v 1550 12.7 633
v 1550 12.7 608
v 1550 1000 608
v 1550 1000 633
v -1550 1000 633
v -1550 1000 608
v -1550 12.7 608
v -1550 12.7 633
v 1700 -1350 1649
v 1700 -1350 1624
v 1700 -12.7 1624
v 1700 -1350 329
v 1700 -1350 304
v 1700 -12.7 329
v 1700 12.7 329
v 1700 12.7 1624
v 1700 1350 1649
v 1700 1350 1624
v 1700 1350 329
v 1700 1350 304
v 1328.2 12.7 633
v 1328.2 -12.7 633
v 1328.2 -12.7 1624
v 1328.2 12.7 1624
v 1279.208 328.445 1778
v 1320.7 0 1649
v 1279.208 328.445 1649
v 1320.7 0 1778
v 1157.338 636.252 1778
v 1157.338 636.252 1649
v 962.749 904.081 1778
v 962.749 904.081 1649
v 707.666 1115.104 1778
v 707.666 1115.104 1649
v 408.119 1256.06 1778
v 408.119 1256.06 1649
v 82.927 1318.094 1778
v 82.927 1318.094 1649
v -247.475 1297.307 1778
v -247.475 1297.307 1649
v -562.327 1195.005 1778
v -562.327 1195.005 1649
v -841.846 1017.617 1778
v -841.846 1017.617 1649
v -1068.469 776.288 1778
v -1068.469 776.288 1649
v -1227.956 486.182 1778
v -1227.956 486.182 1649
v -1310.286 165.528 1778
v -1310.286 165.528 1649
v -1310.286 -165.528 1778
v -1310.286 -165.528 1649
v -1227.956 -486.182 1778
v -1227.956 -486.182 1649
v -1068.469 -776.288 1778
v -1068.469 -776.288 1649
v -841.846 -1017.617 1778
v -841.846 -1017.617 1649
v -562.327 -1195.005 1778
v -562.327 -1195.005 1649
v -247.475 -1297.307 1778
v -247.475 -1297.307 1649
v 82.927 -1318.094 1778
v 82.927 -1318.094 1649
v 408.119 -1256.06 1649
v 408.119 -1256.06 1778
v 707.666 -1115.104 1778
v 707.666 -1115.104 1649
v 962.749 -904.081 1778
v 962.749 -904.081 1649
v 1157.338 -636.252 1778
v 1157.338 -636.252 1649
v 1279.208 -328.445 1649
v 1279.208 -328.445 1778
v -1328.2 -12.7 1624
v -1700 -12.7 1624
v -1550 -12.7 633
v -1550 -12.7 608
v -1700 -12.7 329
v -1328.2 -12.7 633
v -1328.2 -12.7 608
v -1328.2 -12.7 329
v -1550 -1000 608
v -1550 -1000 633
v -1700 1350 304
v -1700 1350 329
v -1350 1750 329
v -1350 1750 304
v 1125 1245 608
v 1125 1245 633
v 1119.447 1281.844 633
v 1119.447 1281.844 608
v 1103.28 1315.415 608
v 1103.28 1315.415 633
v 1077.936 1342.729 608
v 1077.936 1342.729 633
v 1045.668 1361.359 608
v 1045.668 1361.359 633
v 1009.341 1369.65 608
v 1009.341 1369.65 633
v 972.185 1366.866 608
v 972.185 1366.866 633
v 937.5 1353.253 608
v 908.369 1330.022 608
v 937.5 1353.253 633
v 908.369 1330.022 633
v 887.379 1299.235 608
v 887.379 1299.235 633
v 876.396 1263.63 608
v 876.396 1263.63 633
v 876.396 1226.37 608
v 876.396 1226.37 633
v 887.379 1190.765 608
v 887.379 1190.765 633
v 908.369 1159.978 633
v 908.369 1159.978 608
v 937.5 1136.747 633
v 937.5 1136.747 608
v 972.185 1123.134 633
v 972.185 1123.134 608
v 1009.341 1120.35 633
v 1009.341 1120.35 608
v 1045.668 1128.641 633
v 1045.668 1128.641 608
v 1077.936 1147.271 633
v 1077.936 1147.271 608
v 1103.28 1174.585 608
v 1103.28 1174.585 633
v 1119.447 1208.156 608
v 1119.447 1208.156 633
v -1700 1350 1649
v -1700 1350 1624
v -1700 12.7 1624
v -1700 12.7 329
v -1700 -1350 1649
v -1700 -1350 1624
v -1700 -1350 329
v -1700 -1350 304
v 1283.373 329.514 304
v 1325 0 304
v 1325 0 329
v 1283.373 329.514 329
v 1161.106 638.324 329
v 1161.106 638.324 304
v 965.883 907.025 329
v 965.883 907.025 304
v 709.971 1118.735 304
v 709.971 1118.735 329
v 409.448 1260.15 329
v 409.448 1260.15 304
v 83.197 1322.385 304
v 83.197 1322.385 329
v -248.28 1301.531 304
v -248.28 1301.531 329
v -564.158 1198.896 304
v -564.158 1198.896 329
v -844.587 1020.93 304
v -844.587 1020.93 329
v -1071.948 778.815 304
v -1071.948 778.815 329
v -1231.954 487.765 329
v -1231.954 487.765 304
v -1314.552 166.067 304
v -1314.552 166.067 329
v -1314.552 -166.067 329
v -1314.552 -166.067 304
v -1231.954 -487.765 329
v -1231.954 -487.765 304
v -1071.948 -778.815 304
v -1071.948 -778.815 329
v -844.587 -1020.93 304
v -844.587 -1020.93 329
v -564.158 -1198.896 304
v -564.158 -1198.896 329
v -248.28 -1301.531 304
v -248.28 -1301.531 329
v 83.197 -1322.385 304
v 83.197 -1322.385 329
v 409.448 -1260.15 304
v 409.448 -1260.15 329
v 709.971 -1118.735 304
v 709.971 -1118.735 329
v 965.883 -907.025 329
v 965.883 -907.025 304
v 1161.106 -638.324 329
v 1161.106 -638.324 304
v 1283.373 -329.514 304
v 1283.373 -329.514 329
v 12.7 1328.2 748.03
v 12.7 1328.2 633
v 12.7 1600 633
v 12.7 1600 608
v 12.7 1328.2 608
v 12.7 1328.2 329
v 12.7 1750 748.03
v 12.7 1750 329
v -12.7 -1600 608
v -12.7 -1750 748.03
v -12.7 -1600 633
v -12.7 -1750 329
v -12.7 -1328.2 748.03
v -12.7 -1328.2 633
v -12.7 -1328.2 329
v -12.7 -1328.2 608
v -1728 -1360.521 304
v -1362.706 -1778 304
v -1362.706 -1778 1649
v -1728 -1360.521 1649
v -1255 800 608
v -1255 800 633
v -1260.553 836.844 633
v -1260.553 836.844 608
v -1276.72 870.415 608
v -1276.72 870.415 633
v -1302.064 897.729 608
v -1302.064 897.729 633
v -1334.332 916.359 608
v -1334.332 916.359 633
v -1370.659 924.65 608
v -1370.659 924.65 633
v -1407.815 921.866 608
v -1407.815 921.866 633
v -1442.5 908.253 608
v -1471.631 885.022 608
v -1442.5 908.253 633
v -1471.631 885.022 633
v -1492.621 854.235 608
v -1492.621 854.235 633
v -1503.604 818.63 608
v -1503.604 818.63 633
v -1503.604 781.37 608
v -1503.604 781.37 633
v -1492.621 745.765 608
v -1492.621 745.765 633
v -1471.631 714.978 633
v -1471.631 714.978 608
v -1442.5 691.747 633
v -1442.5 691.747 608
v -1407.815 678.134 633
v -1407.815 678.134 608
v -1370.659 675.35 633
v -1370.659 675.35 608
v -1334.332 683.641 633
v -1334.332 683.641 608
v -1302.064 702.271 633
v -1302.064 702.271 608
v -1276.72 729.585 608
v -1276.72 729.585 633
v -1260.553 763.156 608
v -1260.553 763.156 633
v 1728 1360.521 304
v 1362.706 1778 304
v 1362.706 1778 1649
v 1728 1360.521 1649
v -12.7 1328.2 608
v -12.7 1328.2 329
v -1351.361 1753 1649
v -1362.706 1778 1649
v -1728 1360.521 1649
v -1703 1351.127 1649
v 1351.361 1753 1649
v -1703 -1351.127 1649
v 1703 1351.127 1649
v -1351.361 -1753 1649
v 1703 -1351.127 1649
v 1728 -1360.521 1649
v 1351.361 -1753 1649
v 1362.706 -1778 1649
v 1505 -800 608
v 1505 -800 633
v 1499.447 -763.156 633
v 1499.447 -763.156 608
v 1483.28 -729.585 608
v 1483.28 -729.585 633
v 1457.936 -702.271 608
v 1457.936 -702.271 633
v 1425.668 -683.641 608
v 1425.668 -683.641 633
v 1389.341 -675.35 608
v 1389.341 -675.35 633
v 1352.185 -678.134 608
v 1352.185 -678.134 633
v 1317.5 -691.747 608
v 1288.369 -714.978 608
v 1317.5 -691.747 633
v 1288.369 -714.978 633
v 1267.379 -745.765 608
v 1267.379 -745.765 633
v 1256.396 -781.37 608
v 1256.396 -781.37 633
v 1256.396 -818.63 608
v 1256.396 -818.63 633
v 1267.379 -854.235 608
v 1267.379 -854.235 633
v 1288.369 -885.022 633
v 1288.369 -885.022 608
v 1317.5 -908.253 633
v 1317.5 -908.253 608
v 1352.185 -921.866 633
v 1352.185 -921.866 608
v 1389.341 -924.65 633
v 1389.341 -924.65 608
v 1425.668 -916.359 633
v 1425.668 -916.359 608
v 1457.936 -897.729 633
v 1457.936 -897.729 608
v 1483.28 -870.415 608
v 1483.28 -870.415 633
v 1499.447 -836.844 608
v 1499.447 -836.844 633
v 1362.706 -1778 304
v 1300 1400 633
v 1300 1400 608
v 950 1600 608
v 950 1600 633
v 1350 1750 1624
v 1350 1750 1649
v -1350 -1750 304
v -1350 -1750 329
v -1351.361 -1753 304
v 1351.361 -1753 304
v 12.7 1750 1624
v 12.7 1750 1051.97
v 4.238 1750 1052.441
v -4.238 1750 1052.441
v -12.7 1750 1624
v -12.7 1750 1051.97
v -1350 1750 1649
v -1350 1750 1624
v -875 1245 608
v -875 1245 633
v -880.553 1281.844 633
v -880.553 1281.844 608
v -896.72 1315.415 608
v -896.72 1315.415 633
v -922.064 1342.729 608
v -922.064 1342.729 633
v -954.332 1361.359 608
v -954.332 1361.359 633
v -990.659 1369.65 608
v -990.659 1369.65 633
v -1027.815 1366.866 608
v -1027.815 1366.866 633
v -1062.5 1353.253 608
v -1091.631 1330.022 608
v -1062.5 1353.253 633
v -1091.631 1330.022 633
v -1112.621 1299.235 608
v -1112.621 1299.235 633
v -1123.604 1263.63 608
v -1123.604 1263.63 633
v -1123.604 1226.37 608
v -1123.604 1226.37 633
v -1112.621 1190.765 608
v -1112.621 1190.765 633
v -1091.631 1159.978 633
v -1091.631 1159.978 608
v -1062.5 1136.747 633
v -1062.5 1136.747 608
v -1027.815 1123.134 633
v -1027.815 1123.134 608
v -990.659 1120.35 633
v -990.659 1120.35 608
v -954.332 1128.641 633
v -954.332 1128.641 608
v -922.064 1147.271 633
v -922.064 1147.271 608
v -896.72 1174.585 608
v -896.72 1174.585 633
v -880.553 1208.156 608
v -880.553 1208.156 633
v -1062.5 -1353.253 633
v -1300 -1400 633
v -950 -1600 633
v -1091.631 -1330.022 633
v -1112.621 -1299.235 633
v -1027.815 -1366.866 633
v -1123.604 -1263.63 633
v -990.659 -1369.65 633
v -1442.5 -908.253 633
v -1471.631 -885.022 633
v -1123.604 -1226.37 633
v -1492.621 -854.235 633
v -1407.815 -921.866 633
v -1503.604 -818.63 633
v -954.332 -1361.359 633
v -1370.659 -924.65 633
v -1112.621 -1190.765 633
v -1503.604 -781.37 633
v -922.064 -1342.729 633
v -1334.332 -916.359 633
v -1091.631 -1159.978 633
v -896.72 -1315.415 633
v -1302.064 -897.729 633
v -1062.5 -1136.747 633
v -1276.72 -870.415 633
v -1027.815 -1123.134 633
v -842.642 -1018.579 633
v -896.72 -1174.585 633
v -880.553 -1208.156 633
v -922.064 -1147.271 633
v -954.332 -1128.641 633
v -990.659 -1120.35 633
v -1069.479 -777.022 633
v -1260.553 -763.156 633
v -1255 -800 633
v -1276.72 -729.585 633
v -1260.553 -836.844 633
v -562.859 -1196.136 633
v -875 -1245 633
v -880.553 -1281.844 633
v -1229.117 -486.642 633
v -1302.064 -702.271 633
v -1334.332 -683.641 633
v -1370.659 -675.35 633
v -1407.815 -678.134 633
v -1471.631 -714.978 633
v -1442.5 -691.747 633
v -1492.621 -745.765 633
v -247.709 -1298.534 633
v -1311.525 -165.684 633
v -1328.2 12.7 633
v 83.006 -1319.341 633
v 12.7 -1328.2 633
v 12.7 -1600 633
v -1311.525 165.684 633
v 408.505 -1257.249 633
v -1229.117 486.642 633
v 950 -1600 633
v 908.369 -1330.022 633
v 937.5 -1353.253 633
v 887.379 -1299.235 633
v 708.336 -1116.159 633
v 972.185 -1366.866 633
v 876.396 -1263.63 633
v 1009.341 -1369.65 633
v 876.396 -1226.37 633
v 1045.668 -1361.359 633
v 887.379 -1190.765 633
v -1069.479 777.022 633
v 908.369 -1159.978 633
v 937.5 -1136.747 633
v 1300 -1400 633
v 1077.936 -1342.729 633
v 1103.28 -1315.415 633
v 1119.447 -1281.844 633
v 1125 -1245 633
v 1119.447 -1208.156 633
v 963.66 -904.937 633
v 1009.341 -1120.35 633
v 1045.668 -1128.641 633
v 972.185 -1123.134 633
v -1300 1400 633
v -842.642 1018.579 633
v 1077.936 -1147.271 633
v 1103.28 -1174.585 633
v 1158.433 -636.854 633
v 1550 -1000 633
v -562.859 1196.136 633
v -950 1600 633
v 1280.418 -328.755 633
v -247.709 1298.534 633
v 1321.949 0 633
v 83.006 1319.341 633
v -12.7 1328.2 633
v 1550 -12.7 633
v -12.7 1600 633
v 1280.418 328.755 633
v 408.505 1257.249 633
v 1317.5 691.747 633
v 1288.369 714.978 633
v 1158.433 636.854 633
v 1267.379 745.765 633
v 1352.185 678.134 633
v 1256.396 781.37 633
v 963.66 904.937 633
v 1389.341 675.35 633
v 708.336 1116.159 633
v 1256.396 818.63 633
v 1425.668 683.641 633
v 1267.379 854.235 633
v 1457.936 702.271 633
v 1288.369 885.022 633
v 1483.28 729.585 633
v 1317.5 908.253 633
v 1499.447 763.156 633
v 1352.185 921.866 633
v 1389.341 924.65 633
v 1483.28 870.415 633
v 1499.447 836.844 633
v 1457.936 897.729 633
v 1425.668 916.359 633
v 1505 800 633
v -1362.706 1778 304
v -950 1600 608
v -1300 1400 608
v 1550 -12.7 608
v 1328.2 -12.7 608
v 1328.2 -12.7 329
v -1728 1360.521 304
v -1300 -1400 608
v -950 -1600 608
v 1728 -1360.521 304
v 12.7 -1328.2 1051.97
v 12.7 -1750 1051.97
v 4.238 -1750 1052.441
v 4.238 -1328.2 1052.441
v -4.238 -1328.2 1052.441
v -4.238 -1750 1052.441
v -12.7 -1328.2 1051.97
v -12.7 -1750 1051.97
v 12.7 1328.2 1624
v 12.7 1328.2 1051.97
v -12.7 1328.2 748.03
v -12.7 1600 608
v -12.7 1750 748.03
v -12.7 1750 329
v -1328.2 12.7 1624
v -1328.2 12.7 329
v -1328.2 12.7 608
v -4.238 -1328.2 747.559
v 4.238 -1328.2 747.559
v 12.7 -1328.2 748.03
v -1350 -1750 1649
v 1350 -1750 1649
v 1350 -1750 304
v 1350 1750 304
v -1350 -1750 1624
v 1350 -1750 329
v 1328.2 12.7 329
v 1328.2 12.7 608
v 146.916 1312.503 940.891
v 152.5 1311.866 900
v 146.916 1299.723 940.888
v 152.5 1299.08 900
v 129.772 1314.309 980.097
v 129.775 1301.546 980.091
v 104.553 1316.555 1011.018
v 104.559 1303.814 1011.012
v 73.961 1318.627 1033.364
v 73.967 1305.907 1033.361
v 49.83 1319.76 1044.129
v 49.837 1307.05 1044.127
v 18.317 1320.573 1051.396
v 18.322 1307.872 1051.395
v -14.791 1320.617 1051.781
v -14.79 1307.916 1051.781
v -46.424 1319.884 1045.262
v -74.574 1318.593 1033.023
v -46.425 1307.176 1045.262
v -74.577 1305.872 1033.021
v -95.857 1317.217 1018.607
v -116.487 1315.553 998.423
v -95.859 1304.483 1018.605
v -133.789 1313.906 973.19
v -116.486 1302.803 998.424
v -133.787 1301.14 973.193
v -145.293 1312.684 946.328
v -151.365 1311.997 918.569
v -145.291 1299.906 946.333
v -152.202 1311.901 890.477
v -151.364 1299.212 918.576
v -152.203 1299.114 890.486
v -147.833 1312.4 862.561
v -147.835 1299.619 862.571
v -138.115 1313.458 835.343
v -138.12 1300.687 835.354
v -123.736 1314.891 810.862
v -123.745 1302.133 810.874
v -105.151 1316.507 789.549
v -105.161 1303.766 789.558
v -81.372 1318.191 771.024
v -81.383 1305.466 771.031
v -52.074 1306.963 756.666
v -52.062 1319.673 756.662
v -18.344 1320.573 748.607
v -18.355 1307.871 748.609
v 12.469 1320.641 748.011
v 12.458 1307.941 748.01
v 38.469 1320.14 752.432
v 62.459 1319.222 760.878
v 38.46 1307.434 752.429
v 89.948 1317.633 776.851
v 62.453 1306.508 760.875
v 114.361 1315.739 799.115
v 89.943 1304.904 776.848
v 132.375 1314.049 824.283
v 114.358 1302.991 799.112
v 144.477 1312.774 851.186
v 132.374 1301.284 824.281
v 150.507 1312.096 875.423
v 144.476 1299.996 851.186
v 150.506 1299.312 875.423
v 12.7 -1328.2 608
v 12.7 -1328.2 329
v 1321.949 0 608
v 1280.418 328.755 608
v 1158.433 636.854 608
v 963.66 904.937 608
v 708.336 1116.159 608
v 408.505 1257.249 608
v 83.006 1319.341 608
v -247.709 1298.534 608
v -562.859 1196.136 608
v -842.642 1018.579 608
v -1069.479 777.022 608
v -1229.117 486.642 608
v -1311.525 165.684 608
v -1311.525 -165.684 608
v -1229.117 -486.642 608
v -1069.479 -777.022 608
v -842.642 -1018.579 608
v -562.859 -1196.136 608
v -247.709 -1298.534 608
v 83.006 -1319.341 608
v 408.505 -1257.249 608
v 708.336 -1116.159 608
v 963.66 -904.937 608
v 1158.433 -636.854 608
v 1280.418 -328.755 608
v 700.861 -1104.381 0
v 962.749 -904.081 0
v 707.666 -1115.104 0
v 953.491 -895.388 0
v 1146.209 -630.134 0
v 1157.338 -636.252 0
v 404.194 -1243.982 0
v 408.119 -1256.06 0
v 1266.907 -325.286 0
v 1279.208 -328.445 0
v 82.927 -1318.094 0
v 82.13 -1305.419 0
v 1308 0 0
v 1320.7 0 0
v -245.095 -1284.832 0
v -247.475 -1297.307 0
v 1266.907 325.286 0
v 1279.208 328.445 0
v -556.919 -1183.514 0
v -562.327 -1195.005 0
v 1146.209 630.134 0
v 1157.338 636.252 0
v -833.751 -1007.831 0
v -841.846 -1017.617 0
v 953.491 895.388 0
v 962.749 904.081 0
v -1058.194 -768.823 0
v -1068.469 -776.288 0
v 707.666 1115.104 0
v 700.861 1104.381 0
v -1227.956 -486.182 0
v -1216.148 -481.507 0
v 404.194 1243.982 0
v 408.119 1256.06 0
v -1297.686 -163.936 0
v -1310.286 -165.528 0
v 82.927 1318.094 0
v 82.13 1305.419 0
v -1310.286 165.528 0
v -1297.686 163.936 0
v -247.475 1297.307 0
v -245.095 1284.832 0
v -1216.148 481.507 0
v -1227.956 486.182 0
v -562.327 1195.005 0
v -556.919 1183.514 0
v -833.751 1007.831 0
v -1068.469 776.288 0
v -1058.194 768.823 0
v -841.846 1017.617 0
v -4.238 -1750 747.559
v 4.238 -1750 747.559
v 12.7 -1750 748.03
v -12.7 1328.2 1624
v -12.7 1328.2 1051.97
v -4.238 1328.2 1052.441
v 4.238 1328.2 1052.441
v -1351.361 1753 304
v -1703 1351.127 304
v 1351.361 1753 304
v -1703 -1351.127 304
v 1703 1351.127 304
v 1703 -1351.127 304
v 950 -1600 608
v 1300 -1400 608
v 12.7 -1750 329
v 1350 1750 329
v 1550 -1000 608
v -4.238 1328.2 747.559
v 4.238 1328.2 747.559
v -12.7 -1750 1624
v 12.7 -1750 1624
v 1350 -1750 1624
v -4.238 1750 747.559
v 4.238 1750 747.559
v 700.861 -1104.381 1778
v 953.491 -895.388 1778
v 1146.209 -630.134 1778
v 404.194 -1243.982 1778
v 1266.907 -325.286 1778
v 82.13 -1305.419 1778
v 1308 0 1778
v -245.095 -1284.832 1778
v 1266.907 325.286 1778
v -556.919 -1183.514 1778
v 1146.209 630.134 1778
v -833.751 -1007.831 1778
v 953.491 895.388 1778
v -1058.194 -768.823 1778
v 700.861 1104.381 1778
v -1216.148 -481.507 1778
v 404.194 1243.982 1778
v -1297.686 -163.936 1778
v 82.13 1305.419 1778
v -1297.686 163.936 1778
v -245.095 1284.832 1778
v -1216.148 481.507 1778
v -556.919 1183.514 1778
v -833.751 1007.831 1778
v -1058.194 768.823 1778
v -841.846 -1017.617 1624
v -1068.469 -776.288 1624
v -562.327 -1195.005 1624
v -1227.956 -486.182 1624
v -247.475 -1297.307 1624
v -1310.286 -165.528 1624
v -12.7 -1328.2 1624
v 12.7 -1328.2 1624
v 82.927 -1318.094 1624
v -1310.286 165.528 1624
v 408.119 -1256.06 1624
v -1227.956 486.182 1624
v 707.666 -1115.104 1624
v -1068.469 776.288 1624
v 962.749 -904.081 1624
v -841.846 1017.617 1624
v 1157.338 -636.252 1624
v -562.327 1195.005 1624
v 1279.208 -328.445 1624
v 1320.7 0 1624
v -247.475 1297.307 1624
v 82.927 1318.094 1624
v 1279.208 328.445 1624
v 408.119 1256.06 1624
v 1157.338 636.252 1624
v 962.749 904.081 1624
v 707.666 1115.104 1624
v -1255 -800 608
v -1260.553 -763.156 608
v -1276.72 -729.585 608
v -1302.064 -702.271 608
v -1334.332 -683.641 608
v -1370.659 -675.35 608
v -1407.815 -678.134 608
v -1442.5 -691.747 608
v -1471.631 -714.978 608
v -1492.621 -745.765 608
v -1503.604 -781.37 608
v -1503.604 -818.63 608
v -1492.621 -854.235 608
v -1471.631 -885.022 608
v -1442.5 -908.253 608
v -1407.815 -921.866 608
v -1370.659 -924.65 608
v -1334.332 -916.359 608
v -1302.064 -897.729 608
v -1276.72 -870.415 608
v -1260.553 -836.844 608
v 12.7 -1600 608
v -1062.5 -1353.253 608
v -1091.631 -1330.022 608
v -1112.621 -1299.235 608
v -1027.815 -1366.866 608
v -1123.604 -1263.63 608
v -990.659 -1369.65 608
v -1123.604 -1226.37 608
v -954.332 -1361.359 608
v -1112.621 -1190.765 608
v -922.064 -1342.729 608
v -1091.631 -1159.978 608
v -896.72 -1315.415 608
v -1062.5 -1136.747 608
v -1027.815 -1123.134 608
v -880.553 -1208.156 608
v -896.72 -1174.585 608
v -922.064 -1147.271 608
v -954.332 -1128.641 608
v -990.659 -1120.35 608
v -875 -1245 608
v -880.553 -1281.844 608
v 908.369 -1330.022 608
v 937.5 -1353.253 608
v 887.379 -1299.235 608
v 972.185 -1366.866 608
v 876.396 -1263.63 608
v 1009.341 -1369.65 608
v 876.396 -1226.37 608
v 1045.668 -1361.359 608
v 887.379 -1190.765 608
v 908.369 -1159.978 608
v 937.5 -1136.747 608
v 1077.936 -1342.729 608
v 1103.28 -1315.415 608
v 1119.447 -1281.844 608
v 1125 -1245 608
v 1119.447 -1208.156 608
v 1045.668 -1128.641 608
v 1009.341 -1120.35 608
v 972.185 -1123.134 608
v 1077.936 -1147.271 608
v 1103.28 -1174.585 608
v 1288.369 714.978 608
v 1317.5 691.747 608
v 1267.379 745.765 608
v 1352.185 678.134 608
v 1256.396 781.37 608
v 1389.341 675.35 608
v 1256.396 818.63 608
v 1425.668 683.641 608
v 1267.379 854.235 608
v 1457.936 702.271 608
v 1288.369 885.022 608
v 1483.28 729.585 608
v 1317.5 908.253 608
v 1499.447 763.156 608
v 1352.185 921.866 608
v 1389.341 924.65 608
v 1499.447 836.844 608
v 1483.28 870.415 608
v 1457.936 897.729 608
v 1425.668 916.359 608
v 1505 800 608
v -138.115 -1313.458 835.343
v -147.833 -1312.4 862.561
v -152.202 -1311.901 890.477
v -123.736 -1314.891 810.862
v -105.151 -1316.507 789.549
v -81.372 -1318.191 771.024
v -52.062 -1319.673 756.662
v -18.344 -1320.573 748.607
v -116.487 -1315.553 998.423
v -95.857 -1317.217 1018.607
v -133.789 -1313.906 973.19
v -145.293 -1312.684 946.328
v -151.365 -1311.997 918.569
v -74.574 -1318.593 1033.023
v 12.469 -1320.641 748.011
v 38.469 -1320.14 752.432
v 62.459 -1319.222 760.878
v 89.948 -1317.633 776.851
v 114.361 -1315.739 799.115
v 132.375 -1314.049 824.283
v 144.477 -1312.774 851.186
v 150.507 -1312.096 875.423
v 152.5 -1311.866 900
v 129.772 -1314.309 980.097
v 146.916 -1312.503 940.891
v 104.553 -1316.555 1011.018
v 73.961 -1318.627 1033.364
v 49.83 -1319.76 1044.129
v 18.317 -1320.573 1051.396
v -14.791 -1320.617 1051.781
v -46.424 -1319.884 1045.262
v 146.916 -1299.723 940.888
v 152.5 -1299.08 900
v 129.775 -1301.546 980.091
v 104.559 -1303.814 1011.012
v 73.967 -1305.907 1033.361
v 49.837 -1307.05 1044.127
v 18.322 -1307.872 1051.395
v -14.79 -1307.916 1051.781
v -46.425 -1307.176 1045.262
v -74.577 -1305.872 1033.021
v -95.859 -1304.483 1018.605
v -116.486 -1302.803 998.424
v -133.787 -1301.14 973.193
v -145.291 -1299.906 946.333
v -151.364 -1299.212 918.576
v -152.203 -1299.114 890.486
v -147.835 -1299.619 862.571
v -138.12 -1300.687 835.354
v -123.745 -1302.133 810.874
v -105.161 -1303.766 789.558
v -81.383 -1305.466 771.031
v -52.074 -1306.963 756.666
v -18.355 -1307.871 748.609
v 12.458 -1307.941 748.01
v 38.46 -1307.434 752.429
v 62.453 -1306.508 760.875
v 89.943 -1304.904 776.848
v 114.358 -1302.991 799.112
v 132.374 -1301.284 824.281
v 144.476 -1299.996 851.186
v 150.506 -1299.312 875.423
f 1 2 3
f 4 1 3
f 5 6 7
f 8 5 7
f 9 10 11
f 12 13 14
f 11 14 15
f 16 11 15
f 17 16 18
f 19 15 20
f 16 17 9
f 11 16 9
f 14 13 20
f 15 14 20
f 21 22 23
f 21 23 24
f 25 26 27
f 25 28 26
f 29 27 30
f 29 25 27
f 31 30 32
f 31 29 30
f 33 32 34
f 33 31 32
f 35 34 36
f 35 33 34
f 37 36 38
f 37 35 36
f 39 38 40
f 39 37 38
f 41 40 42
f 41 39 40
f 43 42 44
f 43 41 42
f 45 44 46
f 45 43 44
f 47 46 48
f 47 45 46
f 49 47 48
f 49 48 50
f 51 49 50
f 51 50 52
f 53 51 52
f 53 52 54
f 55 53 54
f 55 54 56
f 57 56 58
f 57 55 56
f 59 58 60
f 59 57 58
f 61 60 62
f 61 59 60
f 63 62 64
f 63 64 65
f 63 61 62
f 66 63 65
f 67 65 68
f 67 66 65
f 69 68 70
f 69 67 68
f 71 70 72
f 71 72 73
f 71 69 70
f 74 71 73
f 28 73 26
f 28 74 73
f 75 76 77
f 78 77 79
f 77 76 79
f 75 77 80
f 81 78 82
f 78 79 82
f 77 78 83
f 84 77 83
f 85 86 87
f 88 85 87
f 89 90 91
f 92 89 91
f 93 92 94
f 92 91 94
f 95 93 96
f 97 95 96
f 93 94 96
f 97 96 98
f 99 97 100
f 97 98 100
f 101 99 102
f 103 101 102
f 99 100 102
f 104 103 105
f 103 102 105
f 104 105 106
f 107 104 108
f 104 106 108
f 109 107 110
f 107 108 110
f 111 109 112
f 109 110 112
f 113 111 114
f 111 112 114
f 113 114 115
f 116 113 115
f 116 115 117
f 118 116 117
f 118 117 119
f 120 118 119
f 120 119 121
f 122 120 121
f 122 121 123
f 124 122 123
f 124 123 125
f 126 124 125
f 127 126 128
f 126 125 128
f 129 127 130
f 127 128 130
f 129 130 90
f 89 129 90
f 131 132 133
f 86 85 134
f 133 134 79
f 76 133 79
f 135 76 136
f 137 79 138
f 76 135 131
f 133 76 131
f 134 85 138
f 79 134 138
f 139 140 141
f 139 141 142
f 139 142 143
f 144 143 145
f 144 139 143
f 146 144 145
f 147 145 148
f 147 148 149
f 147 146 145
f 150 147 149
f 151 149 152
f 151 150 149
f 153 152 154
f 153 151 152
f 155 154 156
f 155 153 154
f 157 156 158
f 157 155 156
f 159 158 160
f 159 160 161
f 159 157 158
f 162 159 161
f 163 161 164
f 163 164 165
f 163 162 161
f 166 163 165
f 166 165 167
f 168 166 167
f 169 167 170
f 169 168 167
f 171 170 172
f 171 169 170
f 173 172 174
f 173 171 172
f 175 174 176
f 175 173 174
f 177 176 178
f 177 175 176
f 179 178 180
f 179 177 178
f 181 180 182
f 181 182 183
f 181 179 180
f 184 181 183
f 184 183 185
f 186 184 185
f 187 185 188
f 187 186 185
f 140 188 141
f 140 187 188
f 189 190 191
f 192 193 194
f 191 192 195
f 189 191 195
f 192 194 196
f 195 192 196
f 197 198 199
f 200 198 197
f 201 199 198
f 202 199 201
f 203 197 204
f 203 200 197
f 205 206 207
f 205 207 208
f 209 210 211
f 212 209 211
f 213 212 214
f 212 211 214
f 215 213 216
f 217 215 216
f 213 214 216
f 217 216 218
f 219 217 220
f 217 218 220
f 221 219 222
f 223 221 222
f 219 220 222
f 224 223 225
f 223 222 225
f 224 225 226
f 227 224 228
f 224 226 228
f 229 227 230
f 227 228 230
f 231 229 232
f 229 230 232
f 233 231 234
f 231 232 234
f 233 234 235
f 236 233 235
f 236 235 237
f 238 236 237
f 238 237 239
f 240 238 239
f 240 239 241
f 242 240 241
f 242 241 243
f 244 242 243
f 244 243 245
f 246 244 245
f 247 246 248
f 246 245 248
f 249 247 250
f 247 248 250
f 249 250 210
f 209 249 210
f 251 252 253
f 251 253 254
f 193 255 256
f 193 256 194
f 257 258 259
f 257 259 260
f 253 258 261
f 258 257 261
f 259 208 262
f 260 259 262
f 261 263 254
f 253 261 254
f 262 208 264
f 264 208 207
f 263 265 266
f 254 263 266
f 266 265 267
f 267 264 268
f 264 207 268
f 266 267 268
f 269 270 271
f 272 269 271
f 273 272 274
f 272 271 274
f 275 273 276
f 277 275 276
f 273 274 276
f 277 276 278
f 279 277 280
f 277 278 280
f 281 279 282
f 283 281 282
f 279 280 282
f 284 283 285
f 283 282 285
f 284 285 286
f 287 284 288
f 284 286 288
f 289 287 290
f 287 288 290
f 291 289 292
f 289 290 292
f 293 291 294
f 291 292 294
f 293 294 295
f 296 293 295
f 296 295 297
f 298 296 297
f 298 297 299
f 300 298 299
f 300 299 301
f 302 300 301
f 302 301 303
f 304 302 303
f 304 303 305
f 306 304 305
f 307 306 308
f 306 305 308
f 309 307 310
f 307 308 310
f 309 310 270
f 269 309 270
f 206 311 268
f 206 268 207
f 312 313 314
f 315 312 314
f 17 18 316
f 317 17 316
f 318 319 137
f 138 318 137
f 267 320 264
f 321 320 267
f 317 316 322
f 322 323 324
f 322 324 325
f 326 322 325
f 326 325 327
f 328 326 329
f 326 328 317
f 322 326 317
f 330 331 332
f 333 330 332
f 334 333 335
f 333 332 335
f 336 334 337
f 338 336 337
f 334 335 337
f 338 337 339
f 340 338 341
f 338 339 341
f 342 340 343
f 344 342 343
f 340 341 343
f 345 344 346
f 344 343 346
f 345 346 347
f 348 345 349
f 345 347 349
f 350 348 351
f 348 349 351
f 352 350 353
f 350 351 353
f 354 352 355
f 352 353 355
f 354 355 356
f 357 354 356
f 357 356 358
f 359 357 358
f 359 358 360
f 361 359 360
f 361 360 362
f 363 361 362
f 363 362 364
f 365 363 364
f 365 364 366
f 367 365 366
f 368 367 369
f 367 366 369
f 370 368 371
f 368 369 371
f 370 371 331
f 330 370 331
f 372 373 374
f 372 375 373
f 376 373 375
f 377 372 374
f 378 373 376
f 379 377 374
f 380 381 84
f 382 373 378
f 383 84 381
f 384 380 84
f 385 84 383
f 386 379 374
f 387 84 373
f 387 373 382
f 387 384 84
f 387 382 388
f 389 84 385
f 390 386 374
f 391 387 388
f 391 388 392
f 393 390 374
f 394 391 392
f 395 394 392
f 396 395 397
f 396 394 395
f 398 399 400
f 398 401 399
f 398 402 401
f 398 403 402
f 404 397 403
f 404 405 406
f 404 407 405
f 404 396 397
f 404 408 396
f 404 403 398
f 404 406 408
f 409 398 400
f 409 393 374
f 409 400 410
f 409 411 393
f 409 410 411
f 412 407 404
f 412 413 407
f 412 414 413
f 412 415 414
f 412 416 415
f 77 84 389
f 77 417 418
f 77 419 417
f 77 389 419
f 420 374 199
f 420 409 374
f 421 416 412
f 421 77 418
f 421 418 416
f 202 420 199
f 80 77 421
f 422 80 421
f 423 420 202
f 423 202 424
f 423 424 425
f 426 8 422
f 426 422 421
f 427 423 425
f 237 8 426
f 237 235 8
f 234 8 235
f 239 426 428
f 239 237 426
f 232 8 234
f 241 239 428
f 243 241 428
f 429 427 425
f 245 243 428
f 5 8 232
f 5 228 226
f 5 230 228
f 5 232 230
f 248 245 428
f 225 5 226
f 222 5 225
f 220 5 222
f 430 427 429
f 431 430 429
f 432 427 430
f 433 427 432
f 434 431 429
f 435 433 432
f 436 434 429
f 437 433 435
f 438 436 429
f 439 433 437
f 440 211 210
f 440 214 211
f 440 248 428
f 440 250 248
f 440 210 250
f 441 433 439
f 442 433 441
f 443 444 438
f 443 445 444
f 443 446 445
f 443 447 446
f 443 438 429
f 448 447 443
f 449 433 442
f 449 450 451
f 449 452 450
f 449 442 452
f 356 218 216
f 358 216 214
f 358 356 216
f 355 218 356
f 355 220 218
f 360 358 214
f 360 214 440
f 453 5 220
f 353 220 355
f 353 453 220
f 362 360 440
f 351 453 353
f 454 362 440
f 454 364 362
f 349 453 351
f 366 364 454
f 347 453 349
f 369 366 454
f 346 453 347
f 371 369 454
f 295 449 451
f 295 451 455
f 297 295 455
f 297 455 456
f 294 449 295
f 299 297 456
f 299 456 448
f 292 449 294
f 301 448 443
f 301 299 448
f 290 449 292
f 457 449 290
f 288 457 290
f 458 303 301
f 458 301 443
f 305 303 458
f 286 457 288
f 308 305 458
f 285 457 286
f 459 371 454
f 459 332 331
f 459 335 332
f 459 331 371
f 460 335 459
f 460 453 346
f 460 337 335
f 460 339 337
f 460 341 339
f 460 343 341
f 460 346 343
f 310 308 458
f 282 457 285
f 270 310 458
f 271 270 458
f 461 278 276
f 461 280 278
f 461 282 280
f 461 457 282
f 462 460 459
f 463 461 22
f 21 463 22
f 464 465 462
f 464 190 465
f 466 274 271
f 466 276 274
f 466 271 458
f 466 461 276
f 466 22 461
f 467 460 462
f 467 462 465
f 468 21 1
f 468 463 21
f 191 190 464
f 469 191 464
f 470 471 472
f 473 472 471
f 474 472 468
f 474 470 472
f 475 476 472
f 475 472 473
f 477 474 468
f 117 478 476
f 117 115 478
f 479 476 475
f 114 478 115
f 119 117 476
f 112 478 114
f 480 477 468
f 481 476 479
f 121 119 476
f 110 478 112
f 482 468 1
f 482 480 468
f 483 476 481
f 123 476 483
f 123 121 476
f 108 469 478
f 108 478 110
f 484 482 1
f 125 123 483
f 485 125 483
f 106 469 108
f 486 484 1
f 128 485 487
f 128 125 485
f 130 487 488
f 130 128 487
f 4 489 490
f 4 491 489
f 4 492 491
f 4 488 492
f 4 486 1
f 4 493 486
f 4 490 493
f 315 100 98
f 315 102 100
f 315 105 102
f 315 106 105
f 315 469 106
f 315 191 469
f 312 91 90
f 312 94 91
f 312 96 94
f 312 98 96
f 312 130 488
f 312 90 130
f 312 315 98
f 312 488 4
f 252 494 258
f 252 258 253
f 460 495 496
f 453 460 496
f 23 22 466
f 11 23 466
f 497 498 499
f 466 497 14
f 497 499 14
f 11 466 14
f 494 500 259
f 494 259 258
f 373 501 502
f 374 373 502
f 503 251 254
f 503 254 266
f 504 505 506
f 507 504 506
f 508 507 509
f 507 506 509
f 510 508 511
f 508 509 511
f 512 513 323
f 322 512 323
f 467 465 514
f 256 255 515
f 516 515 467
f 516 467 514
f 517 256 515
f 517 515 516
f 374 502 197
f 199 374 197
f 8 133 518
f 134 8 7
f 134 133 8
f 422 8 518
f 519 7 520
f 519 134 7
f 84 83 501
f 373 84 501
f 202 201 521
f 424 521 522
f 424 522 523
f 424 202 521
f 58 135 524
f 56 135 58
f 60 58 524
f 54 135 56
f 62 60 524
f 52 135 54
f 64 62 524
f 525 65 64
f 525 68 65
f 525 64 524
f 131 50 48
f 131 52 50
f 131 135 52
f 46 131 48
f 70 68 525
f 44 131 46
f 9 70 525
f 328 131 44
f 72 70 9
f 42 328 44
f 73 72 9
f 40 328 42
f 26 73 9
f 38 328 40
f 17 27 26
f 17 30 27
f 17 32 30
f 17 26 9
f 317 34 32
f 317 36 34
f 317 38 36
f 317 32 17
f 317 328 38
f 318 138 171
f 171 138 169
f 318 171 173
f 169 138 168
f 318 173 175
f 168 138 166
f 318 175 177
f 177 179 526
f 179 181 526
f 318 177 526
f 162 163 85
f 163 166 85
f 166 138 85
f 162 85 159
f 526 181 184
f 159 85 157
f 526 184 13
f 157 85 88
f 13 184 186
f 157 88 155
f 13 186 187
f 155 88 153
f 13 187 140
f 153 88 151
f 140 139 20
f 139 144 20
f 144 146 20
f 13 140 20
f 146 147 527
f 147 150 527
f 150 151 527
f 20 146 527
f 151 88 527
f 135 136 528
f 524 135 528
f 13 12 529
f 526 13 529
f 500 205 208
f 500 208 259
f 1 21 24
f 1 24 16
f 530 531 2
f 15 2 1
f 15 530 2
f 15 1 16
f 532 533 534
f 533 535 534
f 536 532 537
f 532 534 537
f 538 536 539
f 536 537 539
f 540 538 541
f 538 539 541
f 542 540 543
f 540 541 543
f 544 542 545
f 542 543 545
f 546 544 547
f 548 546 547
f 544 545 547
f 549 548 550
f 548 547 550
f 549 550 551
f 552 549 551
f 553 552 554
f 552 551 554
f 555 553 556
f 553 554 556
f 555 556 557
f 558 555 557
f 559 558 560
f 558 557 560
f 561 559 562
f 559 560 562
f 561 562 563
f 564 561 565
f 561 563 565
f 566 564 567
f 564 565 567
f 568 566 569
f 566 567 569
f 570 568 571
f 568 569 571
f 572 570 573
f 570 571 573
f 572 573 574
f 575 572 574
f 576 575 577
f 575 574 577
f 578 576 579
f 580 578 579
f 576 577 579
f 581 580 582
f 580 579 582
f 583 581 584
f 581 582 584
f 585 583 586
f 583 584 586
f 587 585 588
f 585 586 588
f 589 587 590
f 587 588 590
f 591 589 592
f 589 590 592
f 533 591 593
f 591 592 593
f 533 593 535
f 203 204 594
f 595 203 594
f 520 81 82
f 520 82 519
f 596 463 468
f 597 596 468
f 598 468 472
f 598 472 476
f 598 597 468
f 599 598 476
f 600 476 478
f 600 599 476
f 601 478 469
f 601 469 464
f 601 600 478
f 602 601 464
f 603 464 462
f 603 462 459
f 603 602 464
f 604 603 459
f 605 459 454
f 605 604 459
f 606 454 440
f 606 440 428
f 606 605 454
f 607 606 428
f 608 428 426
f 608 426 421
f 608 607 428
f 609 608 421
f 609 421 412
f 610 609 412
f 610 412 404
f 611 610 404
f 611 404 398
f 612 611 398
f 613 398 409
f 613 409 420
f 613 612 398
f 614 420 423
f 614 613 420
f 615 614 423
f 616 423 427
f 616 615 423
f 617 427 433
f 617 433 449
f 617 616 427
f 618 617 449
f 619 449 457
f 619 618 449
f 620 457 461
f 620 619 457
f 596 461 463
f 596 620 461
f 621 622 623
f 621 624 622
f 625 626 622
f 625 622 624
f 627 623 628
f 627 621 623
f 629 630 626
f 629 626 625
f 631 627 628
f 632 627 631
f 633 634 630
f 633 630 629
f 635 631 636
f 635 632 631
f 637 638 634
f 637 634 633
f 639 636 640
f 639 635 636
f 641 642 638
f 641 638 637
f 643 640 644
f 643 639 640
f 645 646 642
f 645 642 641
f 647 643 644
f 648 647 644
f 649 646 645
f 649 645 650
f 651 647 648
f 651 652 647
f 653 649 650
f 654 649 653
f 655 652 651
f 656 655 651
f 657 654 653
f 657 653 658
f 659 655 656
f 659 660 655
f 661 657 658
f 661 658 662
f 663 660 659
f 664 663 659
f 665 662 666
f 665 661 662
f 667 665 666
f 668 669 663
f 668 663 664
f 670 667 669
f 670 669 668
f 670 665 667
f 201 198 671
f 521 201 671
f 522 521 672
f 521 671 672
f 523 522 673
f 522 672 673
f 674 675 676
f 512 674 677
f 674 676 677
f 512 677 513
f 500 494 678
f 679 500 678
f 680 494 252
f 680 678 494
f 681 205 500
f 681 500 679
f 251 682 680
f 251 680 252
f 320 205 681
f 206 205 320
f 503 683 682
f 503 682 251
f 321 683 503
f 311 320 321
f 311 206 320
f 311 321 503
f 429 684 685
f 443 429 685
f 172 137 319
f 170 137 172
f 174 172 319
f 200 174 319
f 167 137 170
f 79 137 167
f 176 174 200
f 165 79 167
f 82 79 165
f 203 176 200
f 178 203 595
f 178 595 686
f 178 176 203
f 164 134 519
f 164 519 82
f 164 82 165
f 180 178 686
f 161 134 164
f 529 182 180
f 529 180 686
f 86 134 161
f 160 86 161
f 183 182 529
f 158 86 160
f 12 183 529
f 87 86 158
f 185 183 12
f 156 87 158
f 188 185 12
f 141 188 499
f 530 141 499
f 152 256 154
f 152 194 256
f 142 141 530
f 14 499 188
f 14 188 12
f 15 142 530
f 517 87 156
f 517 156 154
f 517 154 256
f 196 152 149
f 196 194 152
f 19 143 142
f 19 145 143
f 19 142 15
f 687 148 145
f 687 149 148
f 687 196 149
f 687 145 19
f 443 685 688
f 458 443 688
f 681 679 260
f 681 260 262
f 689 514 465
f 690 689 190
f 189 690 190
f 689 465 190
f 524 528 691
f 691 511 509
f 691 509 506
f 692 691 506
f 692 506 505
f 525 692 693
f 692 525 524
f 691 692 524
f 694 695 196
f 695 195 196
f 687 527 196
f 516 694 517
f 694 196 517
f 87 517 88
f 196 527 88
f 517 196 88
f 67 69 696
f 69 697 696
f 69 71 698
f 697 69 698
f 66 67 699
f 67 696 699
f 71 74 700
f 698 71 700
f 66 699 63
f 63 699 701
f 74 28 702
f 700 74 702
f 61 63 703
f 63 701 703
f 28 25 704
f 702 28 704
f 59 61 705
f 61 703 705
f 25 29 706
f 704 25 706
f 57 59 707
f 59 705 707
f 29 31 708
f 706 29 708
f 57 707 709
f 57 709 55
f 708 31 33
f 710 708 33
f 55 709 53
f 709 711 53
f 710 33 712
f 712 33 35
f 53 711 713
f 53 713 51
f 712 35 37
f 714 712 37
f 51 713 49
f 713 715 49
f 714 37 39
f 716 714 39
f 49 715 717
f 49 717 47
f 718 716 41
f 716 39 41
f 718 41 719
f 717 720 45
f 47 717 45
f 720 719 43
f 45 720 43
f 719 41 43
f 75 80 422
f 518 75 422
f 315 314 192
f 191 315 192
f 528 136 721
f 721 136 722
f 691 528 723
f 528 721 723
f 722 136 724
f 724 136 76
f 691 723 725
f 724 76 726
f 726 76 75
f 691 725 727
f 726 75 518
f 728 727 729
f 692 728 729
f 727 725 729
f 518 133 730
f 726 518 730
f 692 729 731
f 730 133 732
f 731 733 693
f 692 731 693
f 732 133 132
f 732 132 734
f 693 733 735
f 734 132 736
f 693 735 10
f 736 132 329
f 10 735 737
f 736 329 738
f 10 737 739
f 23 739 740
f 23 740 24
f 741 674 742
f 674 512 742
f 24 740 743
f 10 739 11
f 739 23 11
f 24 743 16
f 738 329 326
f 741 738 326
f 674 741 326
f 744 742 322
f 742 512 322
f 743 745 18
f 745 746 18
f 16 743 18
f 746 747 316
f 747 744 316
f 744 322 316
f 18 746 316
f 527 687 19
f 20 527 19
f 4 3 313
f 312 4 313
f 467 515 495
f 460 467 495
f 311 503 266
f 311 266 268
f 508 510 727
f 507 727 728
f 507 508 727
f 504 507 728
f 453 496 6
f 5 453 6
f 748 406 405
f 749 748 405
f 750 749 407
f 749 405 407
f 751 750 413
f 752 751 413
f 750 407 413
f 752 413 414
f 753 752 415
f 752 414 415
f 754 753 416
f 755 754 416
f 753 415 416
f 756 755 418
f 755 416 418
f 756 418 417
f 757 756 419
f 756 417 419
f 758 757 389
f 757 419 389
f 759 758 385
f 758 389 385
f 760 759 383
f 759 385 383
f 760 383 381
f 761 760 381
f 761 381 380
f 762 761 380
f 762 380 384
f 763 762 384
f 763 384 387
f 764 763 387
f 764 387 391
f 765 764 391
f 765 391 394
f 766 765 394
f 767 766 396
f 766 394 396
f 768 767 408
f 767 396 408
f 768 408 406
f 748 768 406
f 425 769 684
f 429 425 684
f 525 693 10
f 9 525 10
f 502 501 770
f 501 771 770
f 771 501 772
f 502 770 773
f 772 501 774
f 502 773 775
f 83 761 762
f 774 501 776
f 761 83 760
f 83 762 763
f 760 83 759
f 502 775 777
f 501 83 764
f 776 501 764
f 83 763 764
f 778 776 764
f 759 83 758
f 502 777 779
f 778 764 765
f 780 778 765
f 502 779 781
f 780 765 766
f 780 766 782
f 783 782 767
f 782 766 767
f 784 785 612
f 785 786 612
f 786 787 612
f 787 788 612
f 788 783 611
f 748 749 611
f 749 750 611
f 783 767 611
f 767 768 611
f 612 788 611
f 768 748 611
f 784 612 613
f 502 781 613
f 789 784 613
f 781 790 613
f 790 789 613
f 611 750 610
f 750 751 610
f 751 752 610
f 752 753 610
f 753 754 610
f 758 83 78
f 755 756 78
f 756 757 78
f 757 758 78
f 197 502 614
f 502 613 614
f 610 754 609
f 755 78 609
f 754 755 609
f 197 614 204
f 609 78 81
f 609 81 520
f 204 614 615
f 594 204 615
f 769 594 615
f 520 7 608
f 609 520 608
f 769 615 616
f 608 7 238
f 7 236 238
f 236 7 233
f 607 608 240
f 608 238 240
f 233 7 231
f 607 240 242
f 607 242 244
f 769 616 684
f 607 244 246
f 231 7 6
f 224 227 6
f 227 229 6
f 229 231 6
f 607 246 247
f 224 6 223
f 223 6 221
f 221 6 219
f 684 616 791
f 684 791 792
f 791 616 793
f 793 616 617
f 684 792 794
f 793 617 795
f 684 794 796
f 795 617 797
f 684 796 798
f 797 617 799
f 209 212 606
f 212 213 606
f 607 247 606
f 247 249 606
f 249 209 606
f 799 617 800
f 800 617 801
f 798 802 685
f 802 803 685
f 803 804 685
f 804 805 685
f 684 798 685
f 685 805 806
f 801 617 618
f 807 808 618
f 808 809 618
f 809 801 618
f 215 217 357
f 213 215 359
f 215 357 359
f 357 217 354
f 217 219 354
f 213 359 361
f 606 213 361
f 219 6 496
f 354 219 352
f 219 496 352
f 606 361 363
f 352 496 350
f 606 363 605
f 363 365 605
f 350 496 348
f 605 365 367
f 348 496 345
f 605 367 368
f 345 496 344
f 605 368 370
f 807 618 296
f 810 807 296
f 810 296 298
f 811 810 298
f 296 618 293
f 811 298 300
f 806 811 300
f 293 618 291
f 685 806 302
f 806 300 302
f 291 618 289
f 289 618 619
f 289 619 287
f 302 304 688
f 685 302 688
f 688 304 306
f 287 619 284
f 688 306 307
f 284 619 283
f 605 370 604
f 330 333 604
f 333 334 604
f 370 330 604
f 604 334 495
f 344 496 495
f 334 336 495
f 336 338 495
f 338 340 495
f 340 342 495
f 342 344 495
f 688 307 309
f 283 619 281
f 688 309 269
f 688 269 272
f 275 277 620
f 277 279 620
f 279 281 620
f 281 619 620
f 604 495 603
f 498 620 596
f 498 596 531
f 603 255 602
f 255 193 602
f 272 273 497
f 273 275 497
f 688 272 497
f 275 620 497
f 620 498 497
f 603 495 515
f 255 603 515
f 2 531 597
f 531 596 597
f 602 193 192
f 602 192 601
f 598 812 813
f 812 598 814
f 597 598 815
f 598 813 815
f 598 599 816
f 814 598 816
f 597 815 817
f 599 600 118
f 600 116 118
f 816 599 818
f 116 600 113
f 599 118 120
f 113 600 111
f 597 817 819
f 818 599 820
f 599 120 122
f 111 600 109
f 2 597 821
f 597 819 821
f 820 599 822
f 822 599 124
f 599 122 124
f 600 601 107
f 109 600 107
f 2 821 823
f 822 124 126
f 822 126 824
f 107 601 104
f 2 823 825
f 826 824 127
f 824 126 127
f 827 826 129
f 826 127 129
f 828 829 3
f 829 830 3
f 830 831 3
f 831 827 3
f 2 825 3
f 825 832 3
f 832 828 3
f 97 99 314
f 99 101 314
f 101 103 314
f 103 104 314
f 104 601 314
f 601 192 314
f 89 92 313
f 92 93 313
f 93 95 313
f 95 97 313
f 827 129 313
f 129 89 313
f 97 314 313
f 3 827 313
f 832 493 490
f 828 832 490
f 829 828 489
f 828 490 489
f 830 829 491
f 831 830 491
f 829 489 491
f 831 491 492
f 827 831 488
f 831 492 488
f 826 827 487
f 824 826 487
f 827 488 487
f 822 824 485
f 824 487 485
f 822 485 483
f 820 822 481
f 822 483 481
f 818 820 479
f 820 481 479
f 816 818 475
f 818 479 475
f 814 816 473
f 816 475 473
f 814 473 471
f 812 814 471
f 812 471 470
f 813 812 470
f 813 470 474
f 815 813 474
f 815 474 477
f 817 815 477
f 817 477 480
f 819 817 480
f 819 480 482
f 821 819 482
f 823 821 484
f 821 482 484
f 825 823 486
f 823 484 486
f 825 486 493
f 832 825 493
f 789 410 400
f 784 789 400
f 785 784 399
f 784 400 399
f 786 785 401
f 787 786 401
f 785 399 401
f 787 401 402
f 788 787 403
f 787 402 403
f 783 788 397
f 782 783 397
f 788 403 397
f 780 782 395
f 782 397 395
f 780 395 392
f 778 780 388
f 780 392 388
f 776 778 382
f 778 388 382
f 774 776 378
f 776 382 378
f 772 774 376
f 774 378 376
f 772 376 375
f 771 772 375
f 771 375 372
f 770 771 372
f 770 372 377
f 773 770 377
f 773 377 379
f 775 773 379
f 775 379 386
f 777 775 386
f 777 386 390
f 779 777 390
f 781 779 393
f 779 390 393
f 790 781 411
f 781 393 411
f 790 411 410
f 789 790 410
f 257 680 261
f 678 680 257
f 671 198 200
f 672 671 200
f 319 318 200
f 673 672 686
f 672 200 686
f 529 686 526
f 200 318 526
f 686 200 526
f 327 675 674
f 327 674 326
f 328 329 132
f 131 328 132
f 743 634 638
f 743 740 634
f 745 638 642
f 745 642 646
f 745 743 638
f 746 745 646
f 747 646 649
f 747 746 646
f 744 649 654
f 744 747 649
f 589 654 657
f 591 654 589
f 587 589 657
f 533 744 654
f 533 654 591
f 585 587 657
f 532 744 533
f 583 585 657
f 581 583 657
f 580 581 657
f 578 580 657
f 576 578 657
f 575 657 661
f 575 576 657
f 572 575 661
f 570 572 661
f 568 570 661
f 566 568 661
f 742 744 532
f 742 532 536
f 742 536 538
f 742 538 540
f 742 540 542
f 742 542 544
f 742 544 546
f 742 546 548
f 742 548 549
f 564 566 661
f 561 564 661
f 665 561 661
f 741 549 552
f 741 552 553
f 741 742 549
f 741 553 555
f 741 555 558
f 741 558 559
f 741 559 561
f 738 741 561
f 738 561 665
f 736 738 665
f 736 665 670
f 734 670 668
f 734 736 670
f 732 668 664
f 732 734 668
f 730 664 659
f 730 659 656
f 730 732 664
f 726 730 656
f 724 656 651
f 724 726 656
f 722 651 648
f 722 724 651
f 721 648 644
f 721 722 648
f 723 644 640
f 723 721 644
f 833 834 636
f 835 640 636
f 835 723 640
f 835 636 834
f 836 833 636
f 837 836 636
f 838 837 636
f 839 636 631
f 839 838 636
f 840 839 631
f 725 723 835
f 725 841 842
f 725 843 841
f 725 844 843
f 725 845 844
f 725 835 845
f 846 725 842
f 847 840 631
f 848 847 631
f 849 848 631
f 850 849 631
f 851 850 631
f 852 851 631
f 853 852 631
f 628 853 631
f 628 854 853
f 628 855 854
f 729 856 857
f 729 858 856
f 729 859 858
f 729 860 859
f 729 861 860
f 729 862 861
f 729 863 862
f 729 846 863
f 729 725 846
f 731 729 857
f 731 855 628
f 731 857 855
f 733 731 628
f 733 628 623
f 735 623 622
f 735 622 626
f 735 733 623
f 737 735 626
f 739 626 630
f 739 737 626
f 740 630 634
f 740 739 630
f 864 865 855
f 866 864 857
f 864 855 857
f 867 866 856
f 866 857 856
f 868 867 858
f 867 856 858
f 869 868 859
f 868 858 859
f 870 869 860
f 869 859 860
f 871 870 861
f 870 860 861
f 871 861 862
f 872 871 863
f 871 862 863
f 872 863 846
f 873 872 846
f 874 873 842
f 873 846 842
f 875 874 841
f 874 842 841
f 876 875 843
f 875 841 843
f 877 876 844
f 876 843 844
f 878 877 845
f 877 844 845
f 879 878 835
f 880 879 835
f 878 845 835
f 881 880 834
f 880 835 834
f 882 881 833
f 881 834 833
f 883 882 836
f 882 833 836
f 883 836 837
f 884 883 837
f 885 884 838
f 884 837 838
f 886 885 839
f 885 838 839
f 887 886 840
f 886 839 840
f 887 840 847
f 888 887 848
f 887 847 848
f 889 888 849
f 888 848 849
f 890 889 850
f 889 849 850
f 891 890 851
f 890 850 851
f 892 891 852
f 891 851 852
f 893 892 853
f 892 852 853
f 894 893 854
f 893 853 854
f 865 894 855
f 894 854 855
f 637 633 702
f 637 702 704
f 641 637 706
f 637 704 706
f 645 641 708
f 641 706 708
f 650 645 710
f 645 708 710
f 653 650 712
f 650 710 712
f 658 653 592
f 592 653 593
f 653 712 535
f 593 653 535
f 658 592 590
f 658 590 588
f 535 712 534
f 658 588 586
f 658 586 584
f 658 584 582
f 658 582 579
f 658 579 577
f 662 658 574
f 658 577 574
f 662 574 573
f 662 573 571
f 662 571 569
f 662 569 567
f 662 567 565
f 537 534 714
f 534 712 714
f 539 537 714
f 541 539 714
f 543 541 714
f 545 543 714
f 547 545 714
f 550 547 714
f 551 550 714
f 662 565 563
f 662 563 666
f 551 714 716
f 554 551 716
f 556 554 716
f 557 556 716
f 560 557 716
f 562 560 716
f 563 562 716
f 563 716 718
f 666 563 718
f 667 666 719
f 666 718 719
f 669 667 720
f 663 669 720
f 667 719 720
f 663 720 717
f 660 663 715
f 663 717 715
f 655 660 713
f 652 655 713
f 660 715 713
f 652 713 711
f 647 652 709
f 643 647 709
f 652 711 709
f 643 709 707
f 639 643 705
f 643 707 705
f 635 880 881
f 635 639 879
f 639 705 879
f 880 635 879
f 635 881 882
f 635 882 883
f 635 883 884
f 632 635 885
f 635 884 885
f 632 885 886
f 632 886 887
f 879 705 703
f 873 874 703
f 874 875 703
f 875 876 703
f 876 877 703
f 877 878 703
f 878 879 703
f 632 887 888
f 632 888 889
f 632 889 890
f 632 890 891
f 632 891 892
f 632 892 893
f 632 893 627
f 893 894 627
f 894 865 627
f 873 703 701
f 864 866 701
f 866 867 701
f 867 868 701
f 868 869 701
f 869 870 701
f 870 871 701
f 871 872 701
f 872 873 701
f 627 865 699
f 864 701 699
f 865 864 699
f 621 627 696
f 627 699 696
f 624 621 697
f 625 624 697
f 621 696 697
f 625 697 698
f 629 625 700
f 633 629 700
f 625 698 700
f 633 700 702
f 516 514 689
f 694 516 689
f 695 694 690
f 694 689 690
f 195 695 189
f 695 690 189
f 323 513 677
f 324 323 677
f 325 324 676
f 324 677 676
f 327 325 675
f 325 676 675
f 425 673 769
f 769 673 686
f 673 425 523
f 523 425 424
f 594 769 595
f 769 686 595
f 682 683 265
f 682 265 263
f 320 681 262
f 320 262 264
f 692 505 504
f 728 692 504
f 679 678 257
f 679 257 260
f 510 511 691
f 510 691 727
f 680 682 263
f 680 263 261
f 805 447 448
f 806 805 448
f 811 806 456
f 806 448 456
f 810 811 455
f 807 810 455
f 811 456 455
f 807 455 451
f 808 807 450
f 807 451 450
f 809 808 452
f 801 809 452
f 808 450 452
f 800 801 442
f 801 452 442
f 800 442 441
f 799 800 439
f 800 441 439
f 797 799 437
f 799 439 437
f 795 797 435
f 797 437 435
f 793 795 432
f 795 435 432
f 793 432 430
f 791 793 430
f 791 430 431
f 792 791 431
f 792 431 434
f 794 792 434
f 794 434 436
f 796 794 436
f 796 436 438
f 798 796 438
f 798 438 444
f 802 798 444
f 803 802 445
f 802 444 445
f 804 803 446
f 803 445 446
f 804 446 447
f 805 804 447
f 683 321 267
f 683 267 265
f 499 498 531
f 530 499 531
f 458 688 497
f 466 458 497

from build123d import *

# Parameters (mm, degrees)
F0_W      = 12.7
F0_H      = 1778
F3_W      = 3400
F3_H      = 3500
F3_R      = 1325
F4_DEPTH  = 25
F6_R      = 1321.9493342277
F7_DEPTH  = 25
F8_R      = 125
F9_DEPTH  = 25
F11_DEPTH = 25
F13_R     = 1320.7
F14_DEPTH = 25
F15_W     = 25.4
F15_H     = 421.8
F16_DEPTH = 1320
F15_W_2   = 371.8
F15_H_2   = 25.4
F21_DEPTH = 1345
F19_R     = 152.5
F22_DEPTH = 4000


with BuildPart() as f1:
    # F0 (on Front) → F1 (revolve)
    with BuildSketch(Plane.XZ):
        with Locations((1314.35, 889)):
            Rectangle(F0_W, F0_H)
    revolve(axis=Axis((0, 0, 45.3114323318), (0, 0, 1)))

    # F13 (on offset) → F14 (join)
    with BuildSketch(Plane.XY.offset(1624)):
        Polygon((1350, 1750), (-1350, 1750), (-1700, 1350), (-1700, -1350), (-1350, -1750), (1350, -1750), (1700, -1350), (1700, 1350), align=None)
        Circle(F13_R, mode=Mode.SUBTRACT)
    extrude(amount=F14_DEPTH)


with BuildPart() as f4:
    # F3 (on offset) → F4 (new body)
    with BuildSketch(Plane.XY.offset(304)):
        Rectangle(F3_W, F3_H)
        Circle(F3_R, mode=Mode.SUBTRACT)
    extrude(amount=F4_DEPTH)

    # F10 (on face) → F11 (cut)
    with BuildSketch(Plane.XY.offset(329)):
        Polygon((1700, 1350), (1700, 1750), (1350, 1750), align=None)
        Polygon((1350, -1750), (1700, -1750), (1700, -1350), align=None)
        Polygon((-1700, -1750), (-1350, -1750), (-1700, -1350), align=None)
        Polygon((-1700, 1350), (-1350, 1750), (-1700, 1750), align=None)
    extrude(amount=-F11_DEPTH, mode=Mode.SUBTRACT)


with BuildPart() as f7:
    # F6 (on offset) → F7 (new body)
    with BuildSketch(Plane.XY.offset(608)):
        Polygon((-1550, -1000), (-1300, -1400), (-950, -1600), (950, -1600), (1300, -1400), (1550, -1000), (1550, 1000), (1300, 1400), (950, 1600), (-950, 1600), (-1300, 1400), (-1550, 1000), align=None)
        Circle(F6_R, mode=Mode.SUBTRACT)
    extrude(amount=F7_DEPTH)

    # F8 (on face) → F9 (cut)
    with BuildSketch(Plane.XY.offset(633)):
        with Locations((-1380, 800)):
            Circle(F8_R)
        with Locations((-1380, -800)):
            Circle(F8_R)
        with Locations((1380, 800)):
            Circle(F8_R)
        with Locations((1380, -800)):
            Circle(F8_R)
        with Locations((-1000, 1245)):
            Circle(F8_R)
        with Locations((1000, 1245)):
            Circle(F8_R)
        with Locations((1000, -1245)):
            Circle(F8_R)
        with Locations((-1000, -1245)):
            Circle(F8_R)
    extrude(amount=-F9_DEPTH, mode=Mode.SUBTRACT)


with BuildPart() as f16:
    # F15 (on offset) → F16 (new body, through all)
    with BuildSketch(Plane.XY.offset(304)):
        with Locations((0, 1539.1)):
            Rectangle(F15_W, F15_H)
    extrude(amount=F16_DEPTH)


with BuildPart() as f16b:
    # F15 (on offset) → F16, piece 2 (new body, through all)
    with BuildSketch(Plane.XY.offset(304)):
        with Locations((0, -1539.1)):
            Rectangle(F15_W, F15_H)
    extrude(amount=F16_DEPTH)


with BuildPart() as f16c:
    # F15 (on offset) → F16, piece 3 (new body, through all)
    with BuildSketch(Plane.XY.offset(304)):
        with Locations((-1514.1, 0)):
            Rectangle(F15_W_2, F15_H_2)
    extrude(amount=F16_DEPTH)


with BuildPart() as f16d:
    # F15 (on offset) → F16, piece 4 (new body, through all)
    with BuildSketch(Plane.XY.offset(304)):
        with Locations((1514.1, 0)):
            Rectangle(F15_W_2, F15_H_2)
    extrude(amount=F16_DEPTH)


with BuildPart() as f4_1:
    add(f4.part)

    # F17: union F7, F16, F16b, F16d, F16c
    add(f7.part)
    add(f16.part)
    add(f16b.part)
    add(f16d.part)
    add(f16c.part)


with BuildPart() as f1_1:
    add(f1.part)

    # F18: union F4
    add(f4_1.part)

    # F19 (on Front) → F22 (cut, symmetric)
    with BuildSketch(Plane.XZ):
        with Locations((0, 900)):
            Circle(F19_R)
    extrude(amount=F22_DEPTH, both=True, mode=Mode.SUBTRACT)


with BuildPart() as f21:
    # F20 (on face) → F21 (new body, through all)
    with BuildSketch(Plane(origin=(0, 0, 304), x_dir=(1, 0, 0), z_dir=(0, 0, -1))):
        Polygon((-1728, -1360.5205832509), (-1362.7055103446, -1778), (1362.7055103446, -1778), (1728, -1360.5205832509), (1728, 1360.5205832509), (1362.7055103446, 1778), (-1362.7055103446, 1778), (-1728, 1360.5205832509), align=None)
        Polygon((1351.3613046798, -1753), (-1351.3613046798, -1753), (-1703, -1351.1272053483), (-1703, 1351.1272053483), (-1351.3613046798, 1753), (1351.3613046798, 1753), (1703, 1351.1272053483), (1703, -1351.1272053483), align=None, mode=Mode.SUBTRACT)
    extrude(amount=-F21_DEPTH)


solid = Compound([f1_1.part, f21.part])
